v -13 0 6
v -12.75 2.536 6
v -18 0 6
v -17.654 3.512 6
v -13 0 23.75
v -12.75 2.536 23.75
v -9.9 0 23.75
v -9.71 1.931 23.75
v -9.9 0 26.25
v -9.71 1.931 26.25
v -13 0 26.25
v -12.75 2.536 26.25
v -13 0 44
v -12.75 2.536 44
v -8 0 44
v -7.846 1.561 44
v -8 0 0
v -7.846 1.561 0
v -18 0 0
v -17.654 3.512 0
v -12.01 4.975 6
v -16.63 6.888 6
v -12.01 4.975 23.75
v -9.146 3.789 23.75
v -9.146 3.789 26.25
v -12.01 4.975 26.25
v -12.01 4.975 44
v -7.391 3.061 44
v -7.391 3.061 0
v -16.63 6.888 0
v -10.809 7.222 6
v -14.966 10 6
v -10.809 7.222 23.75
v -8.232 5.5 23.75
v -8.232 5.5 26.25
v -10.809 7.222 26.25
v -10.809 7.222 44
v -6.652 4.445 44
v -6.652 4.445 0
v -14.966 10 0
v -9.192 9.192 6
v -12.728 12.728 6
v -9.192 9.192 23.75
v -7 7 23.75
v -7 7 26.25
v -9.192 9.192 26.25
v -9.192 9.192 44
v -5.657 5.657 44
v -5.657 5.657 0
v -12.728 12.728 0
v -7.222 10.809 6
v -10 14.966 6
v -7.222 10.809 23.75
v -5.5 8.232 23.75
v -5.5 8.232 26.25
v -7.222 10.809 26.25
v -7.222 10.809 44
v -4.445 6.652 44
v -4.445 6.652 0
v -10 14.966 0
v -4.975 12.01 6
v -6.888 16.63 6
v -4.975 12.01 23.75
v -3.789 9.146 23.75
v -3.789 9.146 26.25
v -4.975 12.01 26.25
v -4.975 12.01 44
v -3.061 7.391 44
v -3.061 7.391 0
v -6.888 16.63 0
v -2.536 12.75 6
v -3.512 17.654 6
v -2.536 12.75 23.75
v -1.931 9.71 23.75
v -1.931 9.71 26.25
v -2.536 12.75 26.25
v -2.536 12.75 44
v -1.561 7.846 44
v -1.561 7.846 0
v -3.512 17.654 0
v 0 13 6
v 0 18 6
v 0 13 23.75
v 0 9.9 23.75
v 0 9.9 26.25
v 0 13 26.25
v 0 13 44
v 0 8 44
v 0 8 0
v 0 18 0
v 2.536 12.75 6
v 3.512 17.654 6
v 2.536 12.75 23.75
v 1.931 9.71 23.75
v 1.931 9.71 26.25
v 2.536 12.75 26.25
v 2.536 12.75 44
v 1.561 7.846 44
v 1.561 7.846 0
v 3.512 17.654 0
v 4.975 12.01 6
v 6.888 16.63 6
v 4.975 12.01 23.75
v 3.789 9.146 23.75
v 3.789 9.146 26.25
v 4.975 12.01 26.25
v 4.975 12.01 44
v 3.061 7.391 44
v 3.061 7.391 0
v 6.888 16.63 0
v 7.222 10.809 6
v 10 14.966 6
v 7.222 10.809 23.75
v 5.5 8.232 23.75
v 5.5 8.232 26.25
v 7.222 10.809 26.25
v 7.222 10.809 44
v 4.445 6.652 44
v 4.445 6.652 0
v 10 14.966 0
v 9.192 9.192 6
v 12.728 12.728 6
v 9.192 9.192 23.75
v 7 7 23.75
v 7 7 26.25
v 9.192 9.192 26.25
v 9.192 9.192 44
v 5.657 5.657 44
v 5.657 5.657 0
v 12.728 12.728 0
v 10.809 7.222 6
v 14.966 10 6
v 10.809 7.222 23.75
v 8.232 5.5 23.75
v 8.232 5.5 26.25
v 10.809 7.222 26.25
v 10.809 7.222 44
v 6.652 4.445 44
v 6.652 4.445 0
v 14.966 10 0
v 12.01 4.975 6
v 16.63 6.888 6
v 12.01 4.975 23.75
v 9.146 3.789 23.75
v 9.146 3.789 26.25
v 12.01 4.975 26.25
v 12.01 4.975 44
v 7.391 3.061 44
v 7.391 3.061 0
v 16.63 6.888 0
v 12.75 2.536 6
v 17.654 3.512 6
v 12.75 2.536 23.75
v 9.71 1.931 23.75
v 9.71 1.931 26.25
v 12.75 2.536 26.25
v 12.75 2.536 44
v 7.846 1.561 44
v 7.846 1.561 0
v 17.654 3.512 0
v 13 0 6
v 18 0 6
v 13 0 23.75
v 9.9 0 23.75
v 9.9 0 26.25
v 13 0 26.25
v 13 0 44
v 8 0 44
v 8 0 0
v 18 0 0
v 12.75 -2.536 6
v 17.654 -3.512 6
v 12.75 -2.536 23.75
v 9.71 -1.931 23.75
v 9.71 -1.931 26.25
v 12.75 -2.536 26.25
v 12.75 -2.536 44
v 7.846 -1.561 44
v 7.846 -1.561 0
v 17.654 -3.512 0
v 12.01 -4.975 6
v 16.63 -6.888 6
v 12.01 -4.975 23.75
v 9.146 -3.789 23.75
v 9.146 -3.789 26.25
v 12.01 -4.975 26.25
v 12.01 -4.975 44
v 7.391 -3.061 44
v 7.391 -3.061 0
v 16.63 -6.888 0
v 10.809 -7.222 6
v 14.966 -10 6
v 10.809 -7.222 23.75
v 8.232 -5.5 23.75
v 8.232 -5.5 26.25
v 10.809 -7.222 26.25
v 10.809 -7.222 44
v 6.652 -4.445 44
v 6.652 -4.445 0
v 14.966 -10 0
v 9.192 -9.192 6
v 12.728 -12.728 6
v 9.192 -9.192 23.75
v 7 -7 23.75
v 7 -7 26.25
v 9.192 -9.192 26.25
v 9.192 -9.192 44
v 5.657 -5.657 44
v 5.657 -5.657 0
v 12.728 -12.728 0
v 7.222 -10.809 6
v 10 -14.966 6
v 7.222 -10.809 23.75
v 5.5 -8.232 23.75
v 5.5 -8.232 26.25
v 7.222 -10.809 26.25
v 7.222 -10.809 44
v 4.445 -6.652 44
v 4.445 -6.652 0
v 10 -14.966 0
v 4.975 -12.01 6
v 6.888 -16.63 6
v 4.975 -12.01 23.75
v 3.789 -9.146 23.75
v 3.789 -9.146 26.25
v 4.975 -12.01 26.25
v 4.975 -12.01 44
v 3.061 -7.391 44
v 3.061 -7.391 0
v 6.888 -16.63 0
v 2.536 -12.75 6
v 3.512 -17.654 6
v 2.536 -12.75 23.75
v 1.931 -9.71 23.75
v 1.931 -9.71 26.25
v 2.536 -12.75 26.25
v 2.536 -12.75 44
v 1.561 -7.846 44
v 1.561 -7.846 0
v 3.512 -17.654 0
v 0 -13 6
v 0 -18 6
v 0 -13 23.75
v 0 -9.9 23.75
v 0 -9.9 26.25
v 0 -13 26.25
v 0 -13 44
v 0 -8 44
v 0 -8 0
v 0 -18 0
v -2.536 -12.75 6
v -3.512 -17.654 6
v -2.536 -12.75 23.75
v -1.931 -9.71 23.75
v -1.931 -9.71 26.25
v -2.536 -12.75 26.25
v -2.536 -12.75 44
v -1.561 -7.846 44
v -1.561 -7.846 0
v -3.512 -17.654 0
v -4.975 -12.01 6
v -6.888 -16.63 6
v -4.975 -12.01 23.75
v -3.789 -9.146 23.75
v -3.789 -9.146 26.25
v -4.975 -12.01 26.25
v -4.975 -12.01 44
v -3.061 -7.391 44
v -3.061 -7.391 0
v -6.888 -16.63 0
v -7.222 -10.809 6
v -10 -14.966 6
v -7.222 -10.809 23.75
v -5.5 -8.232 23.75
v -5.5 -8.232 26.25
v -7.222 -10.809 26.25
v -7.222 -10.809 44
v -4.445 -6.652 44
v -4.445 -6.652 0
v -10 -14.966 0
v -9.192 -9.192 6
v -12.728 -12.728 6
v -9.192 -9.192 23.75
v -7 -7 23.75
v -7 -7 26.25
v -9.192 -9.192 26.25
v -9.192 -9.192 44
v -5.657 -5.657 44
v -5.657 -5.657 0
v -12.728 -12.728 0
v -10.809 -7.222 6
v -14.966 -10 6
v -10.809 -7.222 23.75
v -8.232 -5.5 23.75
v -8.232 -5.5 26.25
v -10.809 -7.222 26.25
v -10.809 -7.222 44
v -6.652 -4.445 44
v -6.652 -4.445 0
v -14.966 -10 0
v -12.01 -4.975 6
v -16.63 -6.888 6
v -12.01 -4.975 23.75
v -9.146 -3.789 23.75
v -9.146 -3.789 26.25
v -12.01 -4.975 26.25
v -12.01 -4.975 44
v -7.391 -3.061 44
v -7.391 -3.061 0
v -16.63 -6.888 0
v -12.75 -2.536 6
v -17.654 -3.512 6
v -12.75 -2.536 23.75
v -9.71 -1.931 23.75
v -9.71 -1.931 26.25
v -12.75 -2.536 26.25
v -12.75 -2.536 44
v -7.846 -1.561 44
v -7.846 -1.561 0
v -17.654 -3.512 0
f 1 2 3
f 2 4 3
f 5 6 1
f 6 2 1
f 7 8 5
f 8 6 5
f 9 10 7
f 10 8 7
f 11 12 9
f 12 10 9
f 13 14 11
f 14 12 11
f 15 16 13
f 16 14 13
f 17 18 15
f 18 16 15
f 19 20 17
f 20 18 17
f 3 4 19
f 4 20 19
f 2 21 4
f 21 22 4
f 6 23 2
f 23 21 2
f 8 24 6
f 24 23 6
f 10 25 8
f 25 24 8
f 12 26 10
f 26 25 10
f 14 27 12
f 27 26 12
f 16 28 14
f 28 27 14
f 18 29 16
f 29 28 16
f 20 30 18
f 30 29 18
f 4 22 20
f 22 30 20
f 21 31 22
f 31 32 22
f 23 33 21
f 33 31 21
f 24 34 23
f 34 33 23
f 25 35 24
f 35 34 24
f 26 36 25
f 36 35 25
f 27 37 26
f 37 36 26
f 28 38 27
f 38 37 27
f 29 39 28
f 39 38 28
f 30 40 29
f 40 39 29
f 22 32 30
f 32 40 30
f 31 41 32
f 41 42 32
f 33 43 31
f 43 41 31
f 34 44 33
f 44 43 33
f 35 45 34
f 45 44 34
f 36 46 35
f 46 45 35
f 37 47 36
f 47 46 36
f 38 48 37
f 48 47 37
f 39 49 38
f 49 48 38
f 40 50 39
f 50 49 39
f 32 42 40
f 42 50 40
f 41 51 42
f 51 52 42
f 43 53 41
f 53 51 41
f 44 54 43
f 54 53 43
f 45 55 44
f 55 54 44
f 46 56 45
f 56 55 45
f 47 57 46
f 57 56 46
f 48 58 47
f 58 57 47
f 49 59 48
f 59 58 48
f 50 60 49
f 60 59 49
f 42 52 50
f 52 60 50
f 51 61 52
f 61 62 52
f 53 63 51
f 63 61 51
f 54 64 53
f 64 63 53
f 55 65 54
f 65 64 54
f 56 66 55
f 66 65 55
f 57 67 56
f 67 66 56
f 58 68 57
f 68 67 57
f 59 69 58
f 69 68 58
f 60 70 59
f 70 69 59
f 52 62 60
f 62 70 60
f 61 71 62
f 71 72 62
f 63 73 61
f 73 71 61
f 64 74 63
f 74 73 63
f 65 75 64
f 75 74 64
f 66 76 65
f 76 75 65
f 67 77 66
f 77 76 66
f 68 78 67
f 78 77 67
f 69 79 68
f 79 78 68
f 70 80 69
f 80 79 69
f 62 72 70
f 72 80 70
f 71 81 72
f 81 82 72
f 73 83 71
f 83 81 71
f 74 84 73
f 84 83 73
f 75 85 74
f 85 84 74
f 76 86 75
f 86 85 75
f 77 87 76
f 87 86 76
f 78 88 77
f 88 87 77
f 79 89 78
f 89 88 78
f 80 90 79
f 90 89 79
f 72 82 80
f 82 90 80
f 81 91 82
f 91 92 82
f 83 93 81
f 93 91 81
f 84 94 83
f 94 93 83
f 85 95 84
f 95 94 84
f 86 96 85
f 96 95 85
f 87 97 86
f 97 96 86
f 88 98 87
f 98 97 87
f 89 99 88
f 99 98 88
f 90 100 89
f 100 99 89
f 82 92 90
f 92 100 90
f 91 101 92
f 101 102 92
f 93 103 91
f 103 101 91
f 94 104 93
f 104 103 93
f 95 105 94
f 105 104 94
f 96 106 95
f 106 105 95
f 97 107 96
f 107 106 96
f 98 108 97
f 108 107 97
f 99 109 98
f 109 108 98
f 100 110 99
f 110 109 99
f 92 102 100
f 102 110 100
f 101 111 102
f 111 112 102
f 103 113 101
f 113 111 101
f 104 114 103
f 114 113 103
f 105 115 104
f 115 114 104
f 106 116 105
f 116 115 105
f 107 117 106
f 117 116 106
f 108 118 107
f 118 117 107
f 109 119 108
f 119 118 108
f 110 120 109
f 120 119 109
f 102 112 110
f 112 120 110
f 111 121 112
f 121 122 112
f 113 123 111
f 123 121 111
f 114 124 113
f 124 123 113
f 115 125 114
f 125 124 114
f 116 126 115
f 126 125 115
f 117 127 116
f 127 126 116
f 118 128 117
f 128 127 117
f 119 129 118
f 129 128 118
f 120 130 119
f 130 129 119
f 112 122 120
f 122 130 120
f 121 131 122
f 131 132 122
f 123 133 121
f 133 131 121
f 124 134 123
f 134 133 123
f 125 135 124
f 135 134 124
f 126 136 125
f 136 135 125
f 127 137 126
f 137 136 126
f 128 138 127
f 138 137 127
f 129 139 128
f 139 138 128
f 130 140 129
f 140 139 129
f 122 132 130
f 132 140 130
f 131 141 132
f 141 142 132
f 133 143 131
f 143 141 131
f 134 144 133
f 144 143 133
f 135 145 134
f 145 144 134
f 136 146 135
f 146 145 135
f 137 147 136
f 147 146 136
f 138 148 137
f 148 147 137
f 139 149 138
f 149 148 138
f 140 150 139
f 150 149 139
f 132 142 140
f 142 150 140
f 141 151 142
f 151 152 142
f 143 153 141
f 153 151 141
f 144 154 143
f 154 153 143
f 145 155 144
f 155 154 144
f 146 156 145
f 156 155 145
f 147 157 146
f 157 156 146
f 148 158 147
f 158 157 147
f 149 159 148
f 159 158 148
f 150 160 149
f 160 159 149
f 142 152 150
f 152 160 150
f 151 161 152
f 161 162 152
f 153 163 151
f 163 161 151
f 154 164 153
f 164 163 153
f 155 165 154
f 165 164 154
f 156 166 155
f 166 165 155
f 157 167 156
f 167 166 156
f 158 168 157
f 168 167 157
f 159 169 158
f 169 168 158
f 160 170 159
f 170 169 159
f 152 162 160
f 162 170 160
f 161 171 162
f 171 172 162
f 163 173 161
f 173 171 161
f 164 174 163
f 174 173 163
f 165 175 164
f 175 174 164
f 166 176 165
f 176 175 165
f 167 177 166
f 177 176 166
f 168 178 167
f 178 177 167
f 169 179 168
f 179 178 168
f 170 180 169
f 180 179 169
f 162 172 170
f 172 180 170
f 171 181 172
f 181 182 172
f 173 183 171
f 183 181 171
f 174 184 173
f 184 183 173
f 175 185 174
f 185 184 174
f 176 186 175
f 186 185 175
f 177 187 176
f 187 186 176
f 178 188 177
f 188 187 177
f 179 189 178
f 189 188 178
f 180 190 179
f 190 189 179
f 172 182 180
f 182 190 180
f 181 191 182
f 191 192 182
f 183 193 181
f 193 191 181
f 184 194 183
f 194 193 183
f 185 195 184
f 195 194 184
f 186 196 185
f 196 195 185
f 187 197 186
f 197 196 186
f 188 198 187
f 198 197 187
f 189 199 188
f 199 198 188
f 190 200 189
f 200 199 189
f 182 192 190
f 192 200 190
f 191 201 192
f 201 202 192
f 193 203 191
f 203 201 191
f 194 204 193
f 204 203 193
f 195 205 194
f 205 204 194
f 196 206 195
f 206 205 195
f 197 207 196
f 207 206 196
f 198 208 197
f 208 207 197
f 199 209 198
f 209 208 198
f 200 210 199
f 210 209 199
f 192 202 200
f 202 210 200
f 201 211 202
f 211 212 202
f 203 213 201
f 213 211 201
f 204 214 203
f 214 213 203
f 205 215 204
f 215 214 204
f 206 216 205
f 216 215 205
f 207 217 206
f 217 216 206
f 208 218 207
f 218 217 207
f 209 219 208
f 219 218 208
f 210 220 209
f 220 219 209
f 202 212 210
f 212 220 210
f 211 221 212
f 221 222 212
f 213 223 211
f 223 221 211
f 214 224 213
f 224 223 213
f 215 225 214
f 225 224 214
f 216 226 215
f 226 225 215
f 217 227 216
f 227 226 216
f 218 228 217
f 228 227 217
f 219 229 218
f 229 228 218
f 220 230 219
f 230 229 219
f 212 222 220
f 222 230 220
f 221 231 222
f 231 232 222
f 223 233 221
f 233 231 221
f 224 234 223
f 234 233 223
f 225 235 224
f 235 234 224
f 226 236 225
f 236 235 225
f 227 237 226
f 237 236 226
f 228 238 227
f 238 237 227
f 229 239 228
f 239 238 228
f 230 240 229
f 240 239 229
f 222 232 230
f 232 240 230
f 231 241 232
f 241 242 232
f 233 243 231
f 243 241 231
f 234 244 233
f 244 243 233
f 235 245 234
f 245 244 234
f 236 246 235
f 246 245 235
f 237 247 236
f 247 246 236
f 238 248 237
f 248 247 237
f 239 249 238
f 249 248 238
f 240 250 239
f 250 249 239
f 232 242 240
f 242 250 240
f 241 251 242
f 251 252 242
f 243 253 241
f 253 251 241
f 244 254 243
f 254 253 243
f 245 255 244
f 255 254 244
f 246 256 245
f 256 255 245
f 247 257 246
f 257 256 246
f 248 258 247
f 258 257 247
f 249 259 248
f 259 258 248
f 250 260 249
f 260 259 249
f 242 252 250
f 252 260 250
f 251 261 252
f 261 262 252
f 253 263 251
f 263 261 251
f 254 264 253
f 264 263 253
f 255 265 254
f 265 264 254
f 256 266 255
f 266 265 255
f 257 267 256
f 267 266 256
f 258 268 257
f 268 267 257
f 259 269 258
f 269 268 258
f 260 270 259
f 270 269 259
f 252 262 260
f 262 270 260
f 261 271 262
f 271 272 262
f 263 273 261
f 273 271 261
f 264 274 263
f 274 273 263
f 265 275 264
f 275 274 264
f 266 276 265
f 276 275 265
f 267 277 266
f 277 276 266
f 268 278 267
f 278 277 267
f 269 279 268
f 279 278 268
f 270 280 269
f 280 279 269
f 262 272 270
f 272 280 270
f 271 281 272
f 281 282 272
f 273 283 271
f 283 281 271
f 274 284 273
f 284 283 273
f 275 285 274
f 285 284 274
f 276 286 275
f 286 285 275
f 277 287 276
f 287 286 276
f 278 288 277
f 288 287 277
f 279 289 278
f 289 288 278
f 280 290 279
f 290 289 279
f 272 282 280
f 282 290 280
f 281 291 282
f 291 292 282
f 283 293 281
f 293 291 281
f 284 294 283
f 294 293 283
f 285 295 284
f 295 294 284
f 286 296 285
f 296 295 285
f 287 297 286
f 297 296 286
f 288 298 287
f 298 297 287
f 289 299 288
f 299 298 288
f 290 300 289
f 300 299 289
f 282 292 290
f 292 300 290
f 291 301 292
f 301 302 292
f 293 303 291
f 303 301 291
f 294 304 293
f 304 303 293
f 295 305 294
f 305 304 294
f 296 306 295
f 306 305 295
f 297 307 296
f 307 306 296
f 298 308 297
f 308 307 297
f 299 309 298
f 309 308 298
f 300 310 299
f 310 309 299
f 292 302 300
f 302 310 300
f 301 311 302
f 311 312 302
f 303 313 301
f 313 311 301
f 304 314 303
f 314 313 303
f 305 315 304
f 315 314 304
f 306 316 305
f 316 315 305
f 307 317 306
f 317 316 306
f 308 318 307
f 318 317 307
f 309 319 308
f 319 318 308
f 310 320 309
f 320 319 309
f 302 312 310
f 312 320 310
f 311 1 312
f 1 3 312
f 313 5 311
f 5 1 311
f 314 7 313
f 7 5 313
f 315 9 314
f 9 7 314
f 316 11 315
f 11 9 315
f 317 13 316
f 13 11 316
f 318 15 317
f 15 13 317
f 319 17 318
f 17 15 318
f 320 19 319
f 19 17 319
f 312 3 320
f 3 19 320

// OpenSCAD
$fn = 32;

// ----------------------------------------------------------------------
// Grooved revolve: flanged, bore R8
// ----------------------------------------------------------------------

// --- parameters (mm) ---
bore_r = 8;               // bore radius
outer_r = 13;             // outer radius of the body
total_h = 44;             // overall height, Z
wall = 5;                 // radial wall thickness
groove_w = 2.5;           // groove width
groove_d = 3.1;           // groove depth
grooves = 1;              // number of outer grooves
flange_r = 18;            // flange radius
flange_h = 6;             // flange height

bbox_x = 2 * flange_r;  // full diameter
bore_d = 2 * bore_r;  // bore diameter
body_d = 2 * outer_r;  // body diameter
flange_d = 2 * flange_r;  // flange diameter
revolve_angle = 360;  // full turn around the Z axis

profile = [[8, 0], [13, 0], [18, 0], [18, 6], [13, 6], [13, 23.75], [9.9, 23.75], [9.9, 26.25], [13, 26.25], [13, 44], [8, 44]];  // primary outline, 11 points, counter clockwise

// --- the one profile operation ---
rotate_extrude(angle = revolve_angle) polygon(points = profile);
